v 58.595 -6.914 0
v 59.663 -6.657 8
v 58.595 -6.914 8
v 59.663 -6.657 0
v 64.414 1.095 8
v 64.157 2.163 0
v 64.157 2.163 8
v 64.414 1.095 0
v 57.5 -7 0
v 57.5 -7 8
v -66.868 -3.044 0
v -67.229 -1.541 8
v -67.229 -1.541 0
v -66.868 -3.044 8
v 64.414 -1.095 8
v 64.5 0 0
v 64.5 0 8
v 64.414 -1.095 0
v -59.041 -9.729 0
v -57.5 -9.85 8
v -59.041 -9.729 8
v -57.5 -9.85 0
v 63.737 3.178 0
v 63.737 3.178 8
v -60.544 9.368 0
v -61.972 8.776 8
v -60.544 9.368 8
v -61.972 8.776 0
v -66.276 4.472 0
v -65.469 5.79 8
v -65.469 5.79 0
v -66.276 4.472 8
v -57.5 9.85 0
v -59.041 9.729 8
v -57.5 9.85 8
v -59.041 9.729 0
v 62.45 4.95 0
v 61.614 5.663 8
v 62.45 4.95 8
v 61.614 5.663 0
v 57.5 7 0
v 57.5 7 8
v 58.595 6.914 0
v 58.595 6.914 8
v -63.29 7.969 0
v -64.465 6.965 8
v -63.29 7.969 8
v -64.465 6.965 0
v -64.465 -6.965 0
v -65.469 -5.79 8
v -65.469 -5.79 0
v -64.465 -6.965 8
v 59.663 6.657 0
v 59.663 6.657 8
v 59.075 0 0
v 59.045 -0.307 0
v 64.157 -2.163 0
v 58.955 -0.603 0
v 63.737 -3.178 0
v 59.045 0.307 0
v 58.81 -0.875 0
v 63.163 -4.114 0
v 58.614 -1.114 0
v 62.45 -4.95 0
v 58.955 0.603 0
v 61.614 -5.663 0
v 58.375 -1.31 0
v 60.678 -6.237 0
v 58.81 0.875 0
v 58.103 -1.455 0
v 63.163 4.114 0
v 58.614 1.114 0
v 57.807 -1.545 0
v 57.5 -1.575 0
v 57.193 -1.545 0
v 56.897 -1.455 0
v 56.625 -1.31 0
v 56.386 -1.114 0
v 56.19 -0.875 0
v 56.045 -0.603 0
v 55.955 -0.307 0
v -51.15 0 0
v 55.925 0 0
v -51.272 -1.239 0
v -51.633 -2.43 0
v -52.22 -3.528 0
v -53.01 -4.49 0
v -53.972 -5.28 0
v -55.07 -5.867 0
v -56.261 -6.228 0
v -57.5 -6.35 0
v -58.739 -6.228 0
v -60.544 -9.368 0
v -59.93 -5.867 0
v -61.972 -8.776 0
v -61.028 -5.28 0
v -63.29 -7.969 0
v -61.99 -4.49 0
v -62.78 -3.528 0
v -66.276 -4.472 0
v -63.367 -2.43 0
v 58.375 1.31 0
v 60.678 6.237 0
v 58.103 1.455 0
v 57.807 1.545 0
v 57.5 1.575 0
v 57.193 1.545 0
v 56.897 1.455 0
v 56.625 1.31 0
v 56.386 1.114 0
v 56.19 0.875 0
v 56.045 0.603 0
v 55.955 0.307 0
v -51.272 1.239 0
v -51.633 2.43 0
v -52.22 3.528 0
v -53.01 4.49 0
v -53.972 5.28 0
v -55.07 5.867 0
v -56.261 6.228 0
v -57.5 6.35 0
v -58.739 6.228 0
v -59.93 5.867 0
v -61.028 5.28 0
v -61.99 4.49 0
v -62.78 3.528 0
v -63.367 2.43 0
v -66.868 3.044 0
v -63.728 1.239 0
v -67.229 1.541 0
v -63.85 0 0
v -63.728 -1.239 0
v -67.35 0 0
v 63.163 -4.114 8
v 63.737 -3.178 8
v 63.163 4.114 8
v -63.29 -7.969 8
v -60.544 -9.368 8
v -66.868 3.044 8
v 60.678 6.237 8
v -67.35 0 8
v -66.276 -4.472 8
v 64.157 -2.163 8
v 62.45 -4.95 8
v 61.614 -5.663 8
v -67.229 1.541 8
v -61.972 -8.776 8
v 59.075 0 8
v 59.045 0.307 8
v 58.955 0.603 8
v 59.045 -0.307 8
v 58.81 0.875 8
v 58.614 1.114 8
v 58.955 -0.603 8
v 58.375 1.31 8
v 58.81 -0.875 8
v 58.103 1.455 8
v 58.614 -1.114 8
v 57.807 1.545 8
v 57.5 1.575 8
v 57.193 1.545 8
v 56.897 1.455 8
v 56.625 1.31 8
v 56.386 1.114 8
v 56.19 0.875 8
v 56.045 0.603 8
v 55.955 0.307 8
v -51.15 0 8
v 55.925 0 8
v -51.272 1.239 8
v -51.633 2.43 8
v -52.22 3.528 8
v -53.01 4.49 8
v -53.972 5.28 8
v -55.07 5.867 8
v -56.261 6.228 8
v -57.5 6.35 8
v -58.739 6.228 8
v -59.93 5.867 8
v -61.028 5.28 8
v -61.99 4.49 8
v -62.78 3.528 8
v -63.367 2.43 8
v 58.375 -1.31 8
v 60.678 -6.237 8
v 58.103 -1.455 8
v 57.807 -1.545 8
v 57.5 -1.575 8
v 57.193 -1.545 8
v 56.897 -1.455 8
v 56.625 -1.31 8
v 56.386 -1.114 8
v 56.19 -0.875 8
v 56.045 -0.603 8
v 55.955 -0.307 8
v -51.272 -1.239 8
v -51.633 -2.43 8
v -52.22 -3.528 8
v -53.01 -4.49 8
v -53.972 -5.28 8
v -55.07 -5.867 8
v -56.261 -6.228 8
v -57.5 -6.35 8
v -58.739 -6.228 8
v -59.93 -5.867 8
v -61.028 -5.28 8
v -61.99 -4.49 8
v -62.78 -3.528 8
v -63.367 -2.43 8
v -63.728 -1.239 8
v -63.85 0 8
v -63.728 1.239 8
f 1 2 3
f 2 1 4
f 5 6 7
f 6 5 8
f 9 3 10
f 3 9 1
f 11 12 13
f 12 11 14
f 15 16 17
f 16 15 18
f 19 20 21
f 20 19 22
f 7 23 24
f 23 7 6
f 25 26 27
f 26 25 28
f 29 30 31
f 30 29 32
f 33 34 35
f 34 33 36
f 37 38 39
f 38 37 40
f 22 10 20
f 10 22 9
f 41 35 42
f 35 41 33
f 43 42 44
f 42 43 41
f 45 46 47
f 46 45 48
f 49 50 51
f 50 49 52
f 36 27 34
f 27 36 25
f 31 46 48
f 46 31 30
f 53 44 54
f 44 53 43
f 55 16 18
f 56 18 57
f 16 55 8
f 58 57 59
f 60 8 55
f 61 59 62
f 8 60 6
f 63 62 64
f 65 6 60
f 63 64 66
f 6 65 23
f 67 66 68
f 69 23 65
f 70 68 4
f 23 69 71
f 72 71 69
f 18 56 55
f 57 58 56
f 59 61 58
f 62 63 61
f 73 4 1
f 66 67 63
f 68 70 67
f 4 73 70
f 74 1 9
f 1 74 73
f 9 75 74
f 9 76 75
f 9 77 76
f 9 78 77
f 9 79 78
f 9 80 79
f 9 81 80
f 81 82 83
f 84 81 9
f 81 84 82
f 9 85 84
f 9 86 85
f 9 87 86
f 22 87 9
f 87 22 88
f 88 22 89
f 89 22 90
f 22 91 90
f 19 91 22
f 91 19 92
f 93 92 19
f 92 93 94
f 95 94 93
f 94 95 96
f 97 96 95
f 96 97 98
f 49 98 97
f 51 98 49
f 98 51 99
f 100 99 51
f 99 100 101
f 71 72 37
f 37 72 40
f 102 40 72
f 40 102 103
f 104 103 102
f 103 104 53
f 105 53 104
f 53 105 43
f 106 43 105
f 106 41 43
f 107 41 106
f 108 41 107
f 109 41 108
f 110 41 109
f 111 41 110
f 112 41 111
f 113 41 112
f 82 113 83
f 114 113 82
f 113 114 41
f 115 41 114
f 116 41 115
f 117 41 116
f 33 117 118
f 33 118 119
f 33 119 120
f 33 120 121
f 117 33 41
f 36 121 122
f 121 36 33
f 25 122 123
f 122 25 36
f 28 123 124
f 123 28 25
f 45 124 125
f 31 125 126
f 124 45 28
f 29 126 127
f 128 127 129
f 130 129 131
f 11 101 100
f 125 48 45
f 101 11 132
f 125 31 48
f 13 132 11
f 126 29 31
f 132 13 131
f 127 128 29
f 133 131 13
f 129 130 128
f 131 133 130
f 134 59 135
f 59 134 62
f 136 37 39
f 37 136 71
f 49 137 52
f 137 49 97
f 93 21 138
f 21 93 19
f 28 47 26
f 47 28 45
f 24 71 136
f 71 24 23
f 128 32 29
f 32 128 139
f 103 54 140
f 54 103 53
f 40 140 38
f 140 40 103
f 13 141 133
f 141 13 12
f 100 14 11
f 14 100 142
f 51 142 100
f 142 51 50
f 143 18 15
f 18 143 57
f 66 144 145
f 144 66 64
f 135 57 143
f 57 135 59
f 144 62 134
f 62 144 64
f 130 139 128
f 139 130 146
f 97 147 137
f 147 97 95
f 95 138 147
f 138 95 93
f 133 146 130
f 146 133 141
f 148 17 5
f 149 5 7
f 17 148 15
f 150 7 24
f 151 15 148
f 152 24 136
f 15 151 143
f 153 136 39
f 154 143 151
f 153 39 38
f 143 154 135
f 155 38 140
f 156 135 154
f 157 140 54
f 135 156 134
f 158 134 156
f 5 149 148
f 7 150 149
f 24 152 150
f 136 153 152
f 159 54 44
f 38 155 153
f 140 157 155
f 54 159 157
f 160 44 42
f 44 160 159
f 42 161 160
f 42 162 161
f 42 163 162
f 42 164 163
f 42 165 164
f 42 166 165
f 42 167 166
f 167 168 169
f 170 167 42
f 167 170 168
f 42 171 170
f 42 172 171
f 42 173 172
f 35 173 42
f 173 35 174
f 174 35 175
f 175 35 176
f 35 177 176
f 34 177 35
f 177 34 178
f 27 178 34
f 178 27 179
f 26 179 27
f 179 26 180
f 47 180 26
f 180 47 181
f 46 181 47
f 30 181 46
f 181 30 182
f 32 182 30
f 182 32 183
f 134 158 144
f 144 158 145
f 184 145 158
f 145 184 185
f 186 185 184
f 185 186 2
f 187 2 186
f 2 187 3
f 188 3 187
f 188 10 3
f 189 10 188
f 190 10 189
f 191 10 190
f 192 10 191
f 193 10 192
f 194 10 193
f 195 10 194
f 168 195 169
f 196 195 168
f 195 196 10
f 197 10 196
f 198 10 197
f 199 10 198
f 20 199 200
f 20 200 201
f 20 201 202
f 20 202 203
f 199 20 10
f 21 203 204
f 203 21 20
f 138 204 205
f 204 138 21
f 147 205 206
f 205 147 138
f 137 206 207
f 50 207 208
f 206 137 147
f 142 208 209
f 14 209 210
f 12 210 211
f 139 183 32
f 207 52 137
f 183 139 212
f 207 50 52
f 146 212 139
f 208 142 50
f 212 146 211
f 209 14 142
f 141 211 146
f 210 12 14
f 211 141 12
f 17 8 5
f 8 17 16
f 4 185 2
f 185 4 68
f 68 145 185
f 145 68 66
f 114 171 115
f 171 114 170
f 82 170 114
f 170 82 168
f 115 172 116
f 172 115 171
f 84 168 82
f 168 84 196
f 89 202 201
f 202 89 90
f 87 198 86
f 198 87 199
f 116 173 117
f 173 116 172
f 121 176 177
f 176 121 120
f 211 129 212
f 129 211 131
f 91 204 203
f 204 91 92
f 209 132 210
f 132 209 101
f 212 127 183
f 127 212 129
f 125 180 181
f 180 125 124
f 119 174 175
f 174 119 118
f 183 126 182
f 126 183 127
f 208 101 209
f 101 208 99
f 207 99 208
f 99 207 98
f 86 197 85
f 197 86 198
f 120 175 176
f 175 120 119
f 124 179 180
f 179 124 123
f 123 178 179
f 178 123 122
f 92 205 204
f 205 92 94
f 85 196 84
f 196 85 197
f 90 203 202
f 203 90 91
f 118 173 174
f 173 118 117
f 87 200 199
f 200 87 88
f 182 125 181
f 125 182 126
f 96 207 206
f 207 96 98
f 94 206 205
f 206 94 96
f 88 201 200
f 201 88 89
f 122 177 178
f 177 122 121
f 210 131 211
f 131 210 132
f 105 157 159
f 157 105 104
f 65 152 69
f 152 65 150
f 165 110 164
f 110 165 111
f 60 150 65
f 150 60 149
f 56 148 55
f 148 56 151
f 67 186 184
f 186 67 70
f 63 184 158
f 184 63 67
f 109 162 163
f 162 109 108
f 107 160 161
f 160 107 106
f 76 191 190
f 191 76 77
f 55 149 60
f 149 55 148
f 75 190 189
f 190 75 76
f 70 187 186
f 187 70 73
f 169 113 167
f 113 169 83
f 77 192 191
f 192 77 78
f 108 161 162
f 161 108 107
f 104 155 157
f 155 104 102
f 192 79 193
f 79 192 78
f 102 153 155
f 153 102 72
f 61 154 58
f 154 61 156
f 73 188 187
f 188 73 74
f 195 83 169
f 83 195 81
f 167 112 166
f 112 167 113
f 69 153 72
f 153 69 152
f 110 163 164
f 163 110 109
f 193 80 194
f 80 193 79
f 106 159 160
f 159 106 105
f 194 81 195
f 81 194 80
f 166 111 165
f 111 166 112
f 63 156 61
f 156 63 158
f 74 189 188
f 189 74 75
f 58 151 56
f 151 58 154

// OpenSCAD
$fn = 32;

// ----------------------------------------------------------------------
// Lever: 115 mm between the bosses, 8 mm thick, smooth outline
// ----------------------------------------------------------------------

// --- parameters (mm) ---
lever_l = 115;            // distance between the boss centres
boss_a = 19.7;            // first boss diameter
boss_b = 14;              // second boss diameter
bore_a = 12.7;            // first bore
bore_b = 3.15;            // second bore
lever_t = 8;              // lever thickness

lever_profile = [[-67.35, 0], [-67.229, -1.541], [-66.868, -3.044], [-66.276, -4.472], [-65.469, -5.79], [-64.465, -6.965], [-63.29, -7.969], [-61.972, -8.776], [-60.544, -9.368], [-59.041, -9.729], [-57.5, -9.85], [57.5, -7], [58.595, -6.914], [59.663, -6.657], [60.678, -6.237], [61.614, -5.663], [62.45, -4.95], [63.163, -4.114], [63.737, -3.178], [64.157, -2.163], [64.414, -1.095], [64.5, 0], [64.414, 1.095], [64.157, 2.163], [63.737, 3.178], [63.163, 4.114], [62.45, 4.95], [61.614, 5.663], [60.678, 6.237], [59.663, 6.657], [58.595, 6.914], [57.5, 7], [-57.5, 9.85], [-59.041, 9.729], [-60.544, 9.368], [-61.972, 8.776], [-63.29, 7.969], [-64.465, 6.965], [-65.469, 5.79], [-66.276, 4.472], [-66.868, 3.044], [-67.229, 1.541]];

difference() {
  linear_extrude(height = lever_t) polygon(lever_profile);
  translate([-57.5, 0, -2.5]) cylinder(h = lever_t + 5, d = bore_a);
  translate([57.5, 0, -2.5]) cylinder(h = lever_t + 5, d = bore_b);
}
